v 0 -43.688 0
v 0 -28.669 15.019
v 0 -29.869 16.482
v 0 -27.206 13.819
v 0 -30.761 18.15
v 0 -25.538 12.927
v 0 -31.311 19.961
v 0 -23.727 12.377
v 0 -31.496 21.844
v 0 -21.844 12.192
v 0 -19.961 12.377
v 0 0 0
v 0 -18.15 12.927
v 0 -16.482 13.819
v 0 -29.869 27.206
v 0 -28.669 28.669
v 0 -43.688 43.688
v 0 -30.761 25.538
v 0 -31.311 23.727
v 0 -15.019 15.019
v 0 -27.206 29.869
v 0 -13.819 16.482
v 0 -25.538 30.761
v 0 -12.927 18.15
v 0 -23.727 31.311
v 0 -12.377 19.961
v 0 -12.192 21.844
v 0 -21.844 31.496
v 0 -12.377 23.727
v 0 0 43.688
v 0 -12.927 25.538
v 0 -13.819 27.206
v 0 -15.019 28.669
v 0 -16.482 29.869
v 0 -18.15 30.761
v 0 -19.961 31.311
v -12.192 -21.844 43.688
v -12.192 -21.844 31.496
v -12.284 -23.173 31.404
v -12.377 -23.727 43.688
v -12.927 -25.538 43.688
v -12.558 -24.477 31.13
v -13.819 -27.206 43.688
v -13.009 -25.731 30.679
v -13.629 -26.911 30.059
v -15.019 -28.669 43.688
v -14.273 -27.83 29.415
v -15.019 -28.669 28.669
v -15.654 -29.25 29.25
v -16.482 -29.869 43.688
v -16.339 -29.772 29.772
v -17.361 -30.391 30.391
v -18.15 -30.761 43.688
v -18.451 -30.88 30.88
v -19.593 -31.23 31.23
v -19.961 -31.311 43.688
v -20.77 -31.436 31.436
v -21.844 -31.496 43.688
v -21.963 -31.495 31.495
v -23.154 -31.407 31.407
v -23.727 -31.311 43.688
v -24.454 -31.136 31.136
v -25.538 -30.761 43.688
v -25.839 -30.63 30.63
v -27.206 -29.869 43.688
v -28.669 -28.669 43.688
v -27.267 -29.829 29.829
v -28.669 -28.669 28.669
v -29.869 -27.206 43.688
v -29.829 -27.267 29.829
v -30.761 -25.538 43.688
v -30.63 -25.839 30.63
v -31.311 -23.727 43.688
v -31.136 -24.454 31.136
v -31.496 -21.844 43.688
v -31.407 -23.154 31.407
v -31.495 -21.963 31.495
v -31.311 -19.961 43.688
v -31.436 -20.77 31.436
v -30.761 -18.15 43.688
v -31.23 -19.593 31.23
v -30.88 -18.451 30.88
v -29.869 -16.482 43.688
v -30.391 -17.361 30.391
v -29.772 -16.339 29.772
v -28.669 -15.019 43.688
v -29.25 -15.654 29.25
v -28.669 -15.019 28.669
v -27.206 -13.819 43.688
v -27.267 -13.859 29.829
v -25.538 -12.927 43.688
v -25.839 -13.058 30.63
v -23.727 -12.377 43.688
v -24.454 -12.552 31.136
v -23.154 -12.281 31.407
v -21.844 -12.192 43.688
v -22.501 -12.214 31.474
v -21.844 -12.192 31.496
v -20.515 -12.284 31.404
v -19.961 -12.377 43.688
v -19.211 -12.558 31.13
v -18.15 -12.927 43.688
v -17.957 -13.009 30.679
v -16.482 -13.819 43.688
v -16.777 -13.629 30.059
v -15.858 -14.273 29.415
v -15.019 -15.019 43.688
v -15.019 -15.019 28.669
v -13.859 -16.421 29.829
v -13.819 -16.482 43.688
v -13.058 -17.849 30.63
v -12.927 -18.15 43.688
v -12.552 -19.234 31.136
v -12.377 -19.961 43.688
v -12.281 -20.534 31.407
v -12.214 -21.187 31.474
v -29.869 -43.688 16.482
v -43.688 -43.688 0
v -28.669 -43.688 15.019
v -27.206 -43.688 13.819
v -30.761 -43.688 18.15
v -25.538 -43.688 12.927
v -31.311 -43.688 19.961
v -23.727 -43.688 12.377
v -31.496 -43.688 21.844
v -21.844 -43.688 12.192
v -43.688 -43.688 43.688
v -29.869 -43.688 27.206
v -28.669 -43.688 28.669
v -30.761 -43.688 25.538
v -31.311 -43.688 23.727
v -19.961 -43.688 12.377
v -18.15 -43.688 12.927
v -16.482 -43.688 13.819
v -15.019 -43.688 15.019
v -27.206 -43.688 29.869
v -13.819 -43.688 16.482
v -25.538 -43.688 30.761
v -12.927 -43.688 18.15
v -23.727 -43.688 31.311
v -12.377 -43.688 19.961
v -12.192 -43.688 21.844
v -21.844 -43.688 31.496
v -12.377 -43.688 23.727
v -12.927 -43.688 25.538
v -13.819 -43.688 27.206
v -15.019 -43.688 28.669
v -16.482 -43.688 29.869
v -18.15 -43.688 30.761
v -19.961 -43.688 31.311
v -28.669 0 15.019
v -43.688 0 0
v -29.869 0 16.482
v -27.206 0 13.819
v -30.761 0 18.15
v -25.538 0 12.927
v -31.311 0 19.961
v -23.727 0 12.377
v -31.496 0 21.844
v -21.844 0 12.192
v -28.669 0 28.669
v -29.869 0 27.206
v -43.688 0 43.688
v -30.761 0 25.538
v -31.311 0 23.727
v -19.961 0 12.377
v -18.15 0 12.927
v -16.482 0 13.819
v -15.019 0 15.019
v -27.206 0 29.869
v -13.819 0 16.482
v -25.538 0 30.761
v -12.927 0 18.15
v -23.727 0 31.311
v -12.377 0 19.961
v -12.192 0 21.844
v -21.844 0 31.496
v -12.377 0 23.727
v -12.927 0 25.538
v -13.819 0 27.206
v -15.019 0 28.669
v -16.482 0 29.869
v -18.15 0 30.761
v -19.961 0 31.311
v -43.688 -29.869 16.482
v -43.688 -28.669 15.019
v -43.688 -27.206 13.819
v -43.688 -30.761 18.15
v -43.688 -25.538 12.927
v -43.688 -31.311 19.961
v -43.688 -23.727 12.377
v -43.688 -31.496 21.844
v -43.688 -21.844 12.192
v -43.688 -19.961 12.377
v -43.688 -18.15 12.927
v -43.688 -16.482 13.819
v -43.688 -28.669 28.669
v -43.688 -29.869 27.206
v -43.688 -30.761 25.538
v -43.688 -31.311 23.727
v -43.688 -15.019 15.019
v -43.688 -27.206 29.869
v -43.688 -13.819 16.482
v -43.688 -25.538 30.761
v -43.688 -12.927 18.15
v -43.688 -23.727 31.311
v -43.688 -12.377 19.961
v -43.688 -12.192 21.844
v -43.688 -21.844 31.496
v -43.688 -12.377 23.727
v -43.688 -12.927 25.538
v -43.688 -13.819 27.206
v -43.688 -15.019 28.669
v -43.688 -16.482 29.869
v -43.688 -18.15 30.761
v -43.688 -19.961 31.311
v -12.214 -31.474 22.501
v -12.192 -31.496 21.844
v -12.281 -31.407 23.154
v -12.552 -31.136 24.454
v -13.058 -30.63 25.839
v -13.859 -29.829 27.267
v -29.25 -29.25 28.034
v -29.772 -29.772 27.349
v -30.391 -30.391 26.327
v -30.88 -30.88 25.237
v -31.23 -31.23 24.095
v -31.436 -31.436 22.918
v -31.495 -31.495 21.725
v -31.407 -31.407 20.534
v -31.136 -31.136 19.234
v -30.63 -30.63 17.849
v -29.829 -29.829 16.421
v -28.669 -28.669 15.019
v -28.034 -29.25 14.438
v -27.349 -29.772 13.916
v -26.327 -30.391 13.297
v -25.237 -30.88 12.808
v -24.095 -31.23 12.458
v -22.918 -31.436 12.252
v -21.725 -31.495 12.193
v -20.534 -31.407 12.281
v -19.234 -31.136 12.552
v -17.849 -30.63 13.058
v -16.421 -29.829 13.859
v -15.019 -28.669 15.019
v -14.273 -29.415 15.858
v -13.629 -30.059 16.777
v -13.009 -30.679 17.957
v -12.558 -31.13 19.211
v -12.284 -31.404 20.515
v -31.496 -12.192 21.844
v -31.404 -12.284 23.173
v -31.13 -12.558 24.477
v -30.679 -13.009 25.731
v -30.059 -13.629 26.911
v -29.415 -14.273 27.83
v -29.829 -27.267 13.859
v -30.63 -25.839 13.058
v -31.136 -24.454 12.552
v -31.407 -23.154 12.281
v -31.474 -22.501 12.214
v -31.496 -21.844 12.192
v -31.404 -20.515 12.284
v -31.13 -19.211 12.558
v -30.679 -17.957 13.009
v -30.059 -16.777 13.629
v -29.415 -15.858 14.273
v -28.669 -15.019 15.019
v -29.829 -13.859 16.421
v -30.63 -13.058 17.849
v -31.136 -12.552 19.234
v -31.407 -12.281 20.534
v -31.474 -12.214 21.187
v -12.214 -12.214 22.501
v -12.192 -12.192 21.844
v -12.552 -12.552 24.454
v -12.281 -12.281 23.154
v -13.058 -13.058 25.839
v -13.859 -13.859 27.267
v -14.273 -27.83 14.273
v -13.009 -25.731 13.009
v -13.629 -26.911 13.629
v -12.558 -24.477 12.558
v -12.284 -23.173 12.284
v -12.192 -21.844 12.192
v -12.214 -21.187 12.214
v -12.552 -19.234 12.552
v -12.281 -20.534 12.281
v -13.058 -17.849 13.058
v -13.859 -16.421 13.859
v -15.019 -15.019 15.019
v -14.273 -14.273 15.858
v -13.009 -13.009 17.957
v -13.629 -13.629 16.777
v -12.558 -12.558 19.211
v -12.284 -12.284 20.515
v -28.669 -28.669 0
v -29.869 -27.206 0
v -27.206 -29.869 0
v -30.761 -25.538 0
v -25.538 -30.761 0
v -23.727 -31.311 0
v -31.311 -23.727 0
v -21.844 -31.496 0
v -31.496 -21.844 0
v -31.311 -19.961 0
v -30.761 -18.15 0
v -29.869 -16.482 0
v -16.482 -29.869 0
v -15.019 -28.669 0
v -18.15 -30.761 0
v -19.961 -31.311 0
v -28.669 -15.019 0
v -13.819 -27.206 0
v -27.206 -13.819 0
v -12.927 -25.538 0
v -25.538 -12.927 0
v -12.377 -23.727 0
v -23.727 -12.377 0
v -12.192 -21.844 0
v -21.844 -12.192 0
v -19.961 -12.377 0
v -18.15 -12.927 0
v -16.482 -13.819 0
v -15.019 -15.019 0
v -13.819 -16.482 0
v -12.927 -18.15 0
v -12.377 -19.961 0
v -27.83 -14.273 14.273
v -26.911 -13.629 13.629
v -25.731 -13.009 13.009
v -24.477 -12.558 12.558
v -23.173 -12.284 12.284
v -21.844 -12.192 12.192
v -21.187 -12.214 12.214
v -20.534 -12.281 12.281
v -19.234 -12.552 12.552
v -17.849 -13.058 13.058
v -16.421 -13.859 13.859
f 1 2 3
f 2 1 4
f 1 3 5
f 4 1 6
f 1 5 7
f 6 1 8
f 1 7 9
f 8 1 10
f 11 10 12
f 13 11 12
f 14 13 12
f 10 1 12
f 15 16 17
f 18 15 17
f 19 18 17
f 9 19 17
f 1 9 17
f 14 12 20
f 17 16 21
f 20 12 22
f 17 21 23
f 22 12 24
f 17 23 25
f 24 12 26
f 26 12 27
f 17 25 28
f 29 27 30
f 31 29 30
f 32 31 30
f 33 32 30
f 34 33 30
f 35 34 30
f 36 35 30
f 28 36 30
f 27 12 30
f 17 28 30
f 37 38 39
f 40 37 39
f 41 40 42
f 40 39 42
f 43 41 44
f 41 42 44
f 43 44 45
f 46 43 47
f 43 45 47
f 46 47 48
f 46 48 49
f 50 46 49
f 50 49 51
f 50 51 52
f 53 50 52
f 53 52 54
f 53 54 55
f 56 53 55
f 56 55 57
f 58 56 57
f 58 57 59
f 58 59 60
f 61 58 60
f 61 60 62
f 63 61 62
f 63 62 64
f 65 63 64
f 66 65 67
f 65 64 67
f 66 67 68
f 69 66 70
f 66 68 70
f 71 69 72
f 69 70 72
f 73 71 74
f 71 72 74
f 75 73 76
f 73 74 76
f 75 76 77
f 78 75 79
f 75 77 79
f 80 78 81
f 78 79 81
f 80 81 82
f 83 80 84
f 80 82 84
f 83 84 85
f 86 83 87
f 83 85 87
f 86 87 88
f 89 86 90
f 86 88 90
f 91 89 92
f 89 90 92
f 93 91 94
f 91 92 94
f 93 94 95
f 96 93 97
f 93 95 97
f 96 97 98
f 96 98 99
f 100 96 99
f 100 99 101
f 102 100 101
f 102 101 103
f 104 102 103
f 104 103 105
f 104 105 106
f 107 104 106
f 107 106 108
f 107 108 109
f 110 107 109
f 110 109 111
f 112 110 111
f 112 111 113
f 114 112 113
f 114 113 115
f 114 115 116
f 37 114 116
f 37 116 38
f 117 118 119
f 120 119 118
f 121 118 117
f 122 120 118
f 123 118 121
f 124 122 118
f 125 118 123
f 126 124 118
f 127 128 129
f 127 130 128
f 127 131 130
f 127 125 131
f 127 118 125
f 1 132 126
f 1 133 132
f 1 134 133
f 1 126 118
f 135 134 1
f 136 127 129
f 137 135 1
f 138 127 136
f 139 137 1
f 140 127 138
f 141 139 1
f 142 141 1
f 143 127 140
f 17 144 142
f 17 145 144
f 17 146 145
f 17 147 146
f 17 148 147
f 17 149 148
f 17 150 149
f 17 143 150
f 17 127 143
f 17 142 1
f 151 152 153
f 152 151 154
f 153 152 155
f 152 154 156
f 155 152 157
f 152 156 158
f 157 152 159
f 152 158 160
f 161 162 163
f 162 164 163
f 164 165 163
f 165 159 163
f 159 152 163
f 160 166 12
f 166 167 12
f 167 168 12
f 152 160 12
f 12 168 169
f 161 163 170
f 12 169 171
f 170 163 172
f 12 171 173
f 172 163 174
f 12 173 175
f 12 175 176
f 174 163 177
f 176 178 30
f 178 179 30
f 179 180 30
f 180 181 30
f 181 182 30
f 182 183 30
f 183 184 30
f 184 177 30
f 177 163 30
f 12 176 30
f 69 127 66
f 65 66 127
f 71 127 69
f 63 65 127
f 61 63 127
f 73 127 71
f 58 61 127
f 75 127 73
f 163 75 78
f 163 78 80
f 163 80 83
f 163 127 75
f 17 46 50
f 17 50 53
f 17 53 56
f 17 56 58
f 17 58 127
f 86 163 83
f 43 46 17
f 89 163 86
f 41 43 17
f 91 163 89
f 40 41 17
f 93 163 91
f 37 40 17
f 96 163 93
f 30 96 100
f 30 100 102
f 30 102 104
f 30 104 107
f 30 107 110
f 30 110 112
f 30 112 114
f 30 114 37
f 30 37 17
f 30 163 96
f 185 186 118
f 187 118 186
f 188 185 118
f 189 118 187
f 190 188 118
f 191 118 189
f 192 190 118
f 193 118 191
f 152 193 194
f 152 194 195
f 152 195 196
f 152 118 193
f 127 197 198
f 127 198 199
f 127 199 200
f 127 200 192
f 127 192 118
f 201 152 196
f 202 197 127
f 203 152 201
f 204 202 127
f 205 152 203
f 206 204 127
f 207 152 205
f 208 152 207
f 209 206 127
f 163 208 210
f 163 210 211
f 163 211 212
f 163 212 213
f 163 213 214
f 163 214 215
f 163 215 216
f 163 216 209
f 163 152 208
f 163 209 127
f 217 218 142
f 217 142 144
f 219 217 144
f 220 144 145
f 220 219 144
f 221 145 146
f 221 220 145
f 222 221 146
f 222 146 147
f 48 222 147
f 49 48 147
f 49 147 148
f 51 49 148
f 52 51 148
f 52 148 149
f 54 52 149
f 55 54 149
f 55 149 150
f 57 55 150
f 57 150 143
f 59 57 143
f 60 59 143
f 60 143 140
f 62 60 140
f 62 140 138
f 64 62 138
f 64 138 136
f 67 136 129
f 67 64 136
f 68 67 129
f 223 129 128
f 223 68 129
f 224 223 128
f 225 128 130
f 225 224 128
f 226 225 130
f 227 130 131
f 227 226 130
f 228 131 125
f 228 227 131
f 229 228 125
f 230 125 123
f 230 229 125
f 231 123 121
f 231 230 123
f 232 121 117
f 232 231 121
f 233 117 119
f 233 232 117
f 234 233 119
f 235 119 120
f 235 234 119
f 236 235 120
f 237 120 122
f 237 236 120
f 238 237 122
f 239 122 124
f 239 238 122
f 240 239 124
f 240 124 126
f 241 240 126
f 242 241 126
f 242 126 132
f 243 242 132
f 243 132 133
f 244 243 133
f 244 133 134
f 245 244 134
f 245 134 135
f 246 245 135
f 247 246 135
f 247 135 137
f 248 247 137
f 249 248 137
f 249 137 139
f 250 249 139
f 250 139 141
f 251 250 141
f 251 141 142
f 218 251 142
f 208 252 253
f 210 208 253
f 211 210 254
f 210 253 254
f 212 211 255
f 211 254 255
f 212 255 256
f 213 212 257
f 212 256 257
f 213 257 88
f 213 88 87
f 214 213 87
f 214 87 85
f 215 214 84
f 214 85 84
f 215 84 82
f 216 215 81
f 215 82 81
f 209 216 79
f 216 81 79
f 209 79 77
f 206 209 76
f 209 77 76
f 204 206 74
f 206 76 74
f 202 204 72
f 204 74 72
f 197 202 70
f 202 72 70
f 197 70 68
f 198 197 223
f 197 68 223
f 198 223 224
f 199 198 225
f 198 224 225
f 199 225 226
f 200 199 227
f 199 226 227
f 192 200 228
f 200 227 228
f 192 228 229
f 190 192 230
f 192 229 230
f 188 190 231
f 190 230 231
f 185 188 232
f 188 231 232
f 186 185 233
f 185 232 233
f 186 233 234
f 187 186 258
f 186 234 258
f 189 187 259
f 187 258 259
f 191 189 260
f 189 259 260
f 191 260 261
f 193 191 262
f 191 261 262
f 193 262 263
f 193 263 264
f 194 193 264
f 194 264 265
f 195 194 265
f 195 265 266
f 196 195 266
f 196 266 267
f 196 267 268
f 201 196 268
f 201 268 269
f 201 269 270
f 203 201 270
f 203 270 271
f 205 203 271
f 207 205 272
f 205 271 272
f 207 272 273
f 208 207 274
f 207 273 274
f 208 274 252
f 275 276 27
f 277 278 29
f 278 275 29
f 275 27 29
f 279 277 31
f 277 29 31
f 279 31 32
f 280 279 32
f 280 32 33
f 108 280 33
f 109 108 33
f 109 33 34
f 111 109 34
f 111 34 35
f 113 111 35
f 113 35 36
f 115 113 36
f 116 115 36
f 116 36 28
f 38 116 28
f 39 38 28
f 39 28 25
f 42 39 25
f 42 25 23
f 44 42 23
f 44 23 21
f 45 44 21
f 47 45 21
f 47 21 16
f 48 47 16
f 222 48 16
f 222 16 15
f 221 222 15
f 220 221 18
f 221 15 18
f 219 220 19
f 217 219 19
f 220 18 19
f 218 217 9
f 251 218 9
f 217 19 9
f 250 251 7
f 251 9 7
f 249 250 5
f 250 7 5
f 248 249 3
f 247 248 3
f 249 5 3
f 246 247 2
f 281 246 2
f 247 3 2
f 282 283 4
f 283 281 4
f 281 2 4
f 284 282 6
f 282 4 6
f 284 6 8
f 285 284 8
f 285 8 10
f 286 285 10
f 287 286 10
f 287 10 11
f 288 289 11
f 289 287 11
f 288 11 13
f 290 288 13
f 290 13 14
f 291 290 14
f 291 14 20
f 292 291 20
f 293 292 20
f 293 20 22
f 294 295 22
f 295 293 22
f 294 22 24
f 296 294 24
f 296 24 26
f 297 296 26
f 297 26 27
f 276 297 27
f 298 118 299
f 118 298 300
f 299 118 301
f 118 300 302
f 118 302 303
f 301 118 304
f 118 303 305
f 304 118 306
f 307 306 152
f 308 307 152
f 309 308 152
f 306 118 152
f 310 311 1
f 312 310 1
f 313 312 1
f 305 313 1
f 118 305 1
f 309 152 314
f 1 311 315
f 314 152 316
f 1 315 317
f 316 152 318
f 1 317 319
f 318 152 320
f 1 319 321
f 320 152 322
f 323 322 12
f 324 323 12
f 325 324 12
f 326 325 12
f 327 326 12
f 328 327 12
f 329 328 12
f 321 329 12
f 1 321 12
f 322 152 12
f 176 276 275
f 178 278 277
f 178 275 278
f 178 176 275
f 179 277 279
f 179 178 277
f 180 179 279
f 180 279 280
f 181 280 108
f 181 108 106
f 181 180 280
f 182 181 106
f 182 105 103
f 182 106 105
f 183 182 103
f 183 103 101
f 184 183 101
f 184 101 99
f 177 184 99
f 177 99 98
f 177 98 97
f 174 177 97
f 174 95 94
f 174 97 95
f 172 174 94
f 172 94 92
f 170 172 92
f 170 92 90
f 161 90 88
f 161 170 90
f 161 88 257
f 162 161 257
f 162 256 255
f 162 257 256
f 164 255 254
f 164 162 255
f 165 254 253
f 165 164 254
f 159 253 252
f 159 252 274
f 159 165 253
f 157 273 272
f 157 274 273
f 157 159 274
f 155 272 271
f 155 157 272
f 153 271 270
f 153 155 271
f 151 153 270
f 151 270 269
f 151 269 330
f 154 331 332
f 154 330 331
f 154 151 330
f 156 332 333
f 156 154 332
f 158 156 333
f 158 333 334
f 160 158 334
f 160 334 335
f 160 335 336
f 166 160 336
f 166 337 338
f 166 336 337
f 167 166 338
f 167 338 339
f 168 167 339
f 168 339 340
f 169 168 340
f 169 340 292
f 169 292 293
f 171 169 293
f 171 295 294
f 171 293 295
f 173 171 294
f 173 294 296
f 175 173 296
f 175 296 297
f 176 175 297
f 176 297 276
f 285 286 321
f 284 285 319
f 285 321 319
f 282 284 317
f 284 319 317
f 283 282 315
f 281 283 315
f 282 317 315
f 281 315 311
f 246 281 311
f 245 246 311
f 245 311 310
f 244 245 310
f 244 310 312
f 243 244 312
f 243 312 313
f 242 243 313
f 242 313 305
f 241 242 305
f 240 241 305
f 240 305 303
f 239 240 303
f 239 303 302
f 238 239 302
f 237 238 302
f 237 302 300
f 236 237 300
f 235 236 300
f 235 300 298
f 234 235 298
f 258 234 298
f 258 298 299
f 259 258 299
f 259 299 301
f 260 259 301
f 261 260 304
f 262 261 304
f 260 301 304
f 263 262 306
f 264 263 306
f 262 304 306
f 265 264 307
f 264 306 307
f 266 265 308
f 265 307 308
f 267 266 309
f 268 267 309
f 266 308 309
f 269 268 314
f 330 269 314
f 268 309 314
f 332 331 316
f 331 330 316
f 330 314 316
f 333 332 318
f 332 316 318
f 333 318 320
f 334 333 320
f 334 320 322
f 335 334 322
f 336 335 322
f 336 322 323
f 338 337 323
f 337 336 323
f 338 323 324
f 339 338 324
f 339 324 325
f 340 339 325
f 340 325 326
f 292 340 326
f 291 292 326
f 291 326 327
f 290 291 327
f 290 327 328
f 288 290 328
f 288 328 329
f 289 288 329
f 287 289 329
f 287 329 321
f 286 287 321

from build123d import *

# Parameters (mm, degrees)
F0_W     = 43.688
F0_H     = 43.688
F0_R     = 9.652
F1_DEPTH = 43.688
F2_R     = 9.652
F3_DEPTH = 43.689
F4_R     = 9.652
F5_DEPTH = 43.689


with BuildPart() as f1:
    # F0 (on Front) → F1 (new body)
    with BuildSketch(Plane.XZ):
        with Locations((-21.844, 21.844)):
            Rectangle(F0_W, F0_H)
        with Locations((-21.844, 21.844)):
            Circle(F0_R, mode=Mode.SUBTRACT)
    extrude(amount=F1_DEPTH)

    # F2 (on face) → F3 (cut, through all)
    with BuildSketch(Plane(origin=(0, 0, 0), x_dir=(1, 0, 0), z_dir=(0, 0, -1))):
        with Locations((-21.844, 21.844)):
            Circle(F2_R)
    extrude(amount=-F3_DEPTH, mode=Mode.SUBTRACT)

    # F4 (on Right) → F5 (cut, through all)
    with BuildSketch(Plane.YZ):
        with Locations((-21.844, 21.844)):
            Circle(F4_R)
    extrude(amount=-F5_DEPTH, mode=Mode.SUBTRACT)


solid = f1.part
